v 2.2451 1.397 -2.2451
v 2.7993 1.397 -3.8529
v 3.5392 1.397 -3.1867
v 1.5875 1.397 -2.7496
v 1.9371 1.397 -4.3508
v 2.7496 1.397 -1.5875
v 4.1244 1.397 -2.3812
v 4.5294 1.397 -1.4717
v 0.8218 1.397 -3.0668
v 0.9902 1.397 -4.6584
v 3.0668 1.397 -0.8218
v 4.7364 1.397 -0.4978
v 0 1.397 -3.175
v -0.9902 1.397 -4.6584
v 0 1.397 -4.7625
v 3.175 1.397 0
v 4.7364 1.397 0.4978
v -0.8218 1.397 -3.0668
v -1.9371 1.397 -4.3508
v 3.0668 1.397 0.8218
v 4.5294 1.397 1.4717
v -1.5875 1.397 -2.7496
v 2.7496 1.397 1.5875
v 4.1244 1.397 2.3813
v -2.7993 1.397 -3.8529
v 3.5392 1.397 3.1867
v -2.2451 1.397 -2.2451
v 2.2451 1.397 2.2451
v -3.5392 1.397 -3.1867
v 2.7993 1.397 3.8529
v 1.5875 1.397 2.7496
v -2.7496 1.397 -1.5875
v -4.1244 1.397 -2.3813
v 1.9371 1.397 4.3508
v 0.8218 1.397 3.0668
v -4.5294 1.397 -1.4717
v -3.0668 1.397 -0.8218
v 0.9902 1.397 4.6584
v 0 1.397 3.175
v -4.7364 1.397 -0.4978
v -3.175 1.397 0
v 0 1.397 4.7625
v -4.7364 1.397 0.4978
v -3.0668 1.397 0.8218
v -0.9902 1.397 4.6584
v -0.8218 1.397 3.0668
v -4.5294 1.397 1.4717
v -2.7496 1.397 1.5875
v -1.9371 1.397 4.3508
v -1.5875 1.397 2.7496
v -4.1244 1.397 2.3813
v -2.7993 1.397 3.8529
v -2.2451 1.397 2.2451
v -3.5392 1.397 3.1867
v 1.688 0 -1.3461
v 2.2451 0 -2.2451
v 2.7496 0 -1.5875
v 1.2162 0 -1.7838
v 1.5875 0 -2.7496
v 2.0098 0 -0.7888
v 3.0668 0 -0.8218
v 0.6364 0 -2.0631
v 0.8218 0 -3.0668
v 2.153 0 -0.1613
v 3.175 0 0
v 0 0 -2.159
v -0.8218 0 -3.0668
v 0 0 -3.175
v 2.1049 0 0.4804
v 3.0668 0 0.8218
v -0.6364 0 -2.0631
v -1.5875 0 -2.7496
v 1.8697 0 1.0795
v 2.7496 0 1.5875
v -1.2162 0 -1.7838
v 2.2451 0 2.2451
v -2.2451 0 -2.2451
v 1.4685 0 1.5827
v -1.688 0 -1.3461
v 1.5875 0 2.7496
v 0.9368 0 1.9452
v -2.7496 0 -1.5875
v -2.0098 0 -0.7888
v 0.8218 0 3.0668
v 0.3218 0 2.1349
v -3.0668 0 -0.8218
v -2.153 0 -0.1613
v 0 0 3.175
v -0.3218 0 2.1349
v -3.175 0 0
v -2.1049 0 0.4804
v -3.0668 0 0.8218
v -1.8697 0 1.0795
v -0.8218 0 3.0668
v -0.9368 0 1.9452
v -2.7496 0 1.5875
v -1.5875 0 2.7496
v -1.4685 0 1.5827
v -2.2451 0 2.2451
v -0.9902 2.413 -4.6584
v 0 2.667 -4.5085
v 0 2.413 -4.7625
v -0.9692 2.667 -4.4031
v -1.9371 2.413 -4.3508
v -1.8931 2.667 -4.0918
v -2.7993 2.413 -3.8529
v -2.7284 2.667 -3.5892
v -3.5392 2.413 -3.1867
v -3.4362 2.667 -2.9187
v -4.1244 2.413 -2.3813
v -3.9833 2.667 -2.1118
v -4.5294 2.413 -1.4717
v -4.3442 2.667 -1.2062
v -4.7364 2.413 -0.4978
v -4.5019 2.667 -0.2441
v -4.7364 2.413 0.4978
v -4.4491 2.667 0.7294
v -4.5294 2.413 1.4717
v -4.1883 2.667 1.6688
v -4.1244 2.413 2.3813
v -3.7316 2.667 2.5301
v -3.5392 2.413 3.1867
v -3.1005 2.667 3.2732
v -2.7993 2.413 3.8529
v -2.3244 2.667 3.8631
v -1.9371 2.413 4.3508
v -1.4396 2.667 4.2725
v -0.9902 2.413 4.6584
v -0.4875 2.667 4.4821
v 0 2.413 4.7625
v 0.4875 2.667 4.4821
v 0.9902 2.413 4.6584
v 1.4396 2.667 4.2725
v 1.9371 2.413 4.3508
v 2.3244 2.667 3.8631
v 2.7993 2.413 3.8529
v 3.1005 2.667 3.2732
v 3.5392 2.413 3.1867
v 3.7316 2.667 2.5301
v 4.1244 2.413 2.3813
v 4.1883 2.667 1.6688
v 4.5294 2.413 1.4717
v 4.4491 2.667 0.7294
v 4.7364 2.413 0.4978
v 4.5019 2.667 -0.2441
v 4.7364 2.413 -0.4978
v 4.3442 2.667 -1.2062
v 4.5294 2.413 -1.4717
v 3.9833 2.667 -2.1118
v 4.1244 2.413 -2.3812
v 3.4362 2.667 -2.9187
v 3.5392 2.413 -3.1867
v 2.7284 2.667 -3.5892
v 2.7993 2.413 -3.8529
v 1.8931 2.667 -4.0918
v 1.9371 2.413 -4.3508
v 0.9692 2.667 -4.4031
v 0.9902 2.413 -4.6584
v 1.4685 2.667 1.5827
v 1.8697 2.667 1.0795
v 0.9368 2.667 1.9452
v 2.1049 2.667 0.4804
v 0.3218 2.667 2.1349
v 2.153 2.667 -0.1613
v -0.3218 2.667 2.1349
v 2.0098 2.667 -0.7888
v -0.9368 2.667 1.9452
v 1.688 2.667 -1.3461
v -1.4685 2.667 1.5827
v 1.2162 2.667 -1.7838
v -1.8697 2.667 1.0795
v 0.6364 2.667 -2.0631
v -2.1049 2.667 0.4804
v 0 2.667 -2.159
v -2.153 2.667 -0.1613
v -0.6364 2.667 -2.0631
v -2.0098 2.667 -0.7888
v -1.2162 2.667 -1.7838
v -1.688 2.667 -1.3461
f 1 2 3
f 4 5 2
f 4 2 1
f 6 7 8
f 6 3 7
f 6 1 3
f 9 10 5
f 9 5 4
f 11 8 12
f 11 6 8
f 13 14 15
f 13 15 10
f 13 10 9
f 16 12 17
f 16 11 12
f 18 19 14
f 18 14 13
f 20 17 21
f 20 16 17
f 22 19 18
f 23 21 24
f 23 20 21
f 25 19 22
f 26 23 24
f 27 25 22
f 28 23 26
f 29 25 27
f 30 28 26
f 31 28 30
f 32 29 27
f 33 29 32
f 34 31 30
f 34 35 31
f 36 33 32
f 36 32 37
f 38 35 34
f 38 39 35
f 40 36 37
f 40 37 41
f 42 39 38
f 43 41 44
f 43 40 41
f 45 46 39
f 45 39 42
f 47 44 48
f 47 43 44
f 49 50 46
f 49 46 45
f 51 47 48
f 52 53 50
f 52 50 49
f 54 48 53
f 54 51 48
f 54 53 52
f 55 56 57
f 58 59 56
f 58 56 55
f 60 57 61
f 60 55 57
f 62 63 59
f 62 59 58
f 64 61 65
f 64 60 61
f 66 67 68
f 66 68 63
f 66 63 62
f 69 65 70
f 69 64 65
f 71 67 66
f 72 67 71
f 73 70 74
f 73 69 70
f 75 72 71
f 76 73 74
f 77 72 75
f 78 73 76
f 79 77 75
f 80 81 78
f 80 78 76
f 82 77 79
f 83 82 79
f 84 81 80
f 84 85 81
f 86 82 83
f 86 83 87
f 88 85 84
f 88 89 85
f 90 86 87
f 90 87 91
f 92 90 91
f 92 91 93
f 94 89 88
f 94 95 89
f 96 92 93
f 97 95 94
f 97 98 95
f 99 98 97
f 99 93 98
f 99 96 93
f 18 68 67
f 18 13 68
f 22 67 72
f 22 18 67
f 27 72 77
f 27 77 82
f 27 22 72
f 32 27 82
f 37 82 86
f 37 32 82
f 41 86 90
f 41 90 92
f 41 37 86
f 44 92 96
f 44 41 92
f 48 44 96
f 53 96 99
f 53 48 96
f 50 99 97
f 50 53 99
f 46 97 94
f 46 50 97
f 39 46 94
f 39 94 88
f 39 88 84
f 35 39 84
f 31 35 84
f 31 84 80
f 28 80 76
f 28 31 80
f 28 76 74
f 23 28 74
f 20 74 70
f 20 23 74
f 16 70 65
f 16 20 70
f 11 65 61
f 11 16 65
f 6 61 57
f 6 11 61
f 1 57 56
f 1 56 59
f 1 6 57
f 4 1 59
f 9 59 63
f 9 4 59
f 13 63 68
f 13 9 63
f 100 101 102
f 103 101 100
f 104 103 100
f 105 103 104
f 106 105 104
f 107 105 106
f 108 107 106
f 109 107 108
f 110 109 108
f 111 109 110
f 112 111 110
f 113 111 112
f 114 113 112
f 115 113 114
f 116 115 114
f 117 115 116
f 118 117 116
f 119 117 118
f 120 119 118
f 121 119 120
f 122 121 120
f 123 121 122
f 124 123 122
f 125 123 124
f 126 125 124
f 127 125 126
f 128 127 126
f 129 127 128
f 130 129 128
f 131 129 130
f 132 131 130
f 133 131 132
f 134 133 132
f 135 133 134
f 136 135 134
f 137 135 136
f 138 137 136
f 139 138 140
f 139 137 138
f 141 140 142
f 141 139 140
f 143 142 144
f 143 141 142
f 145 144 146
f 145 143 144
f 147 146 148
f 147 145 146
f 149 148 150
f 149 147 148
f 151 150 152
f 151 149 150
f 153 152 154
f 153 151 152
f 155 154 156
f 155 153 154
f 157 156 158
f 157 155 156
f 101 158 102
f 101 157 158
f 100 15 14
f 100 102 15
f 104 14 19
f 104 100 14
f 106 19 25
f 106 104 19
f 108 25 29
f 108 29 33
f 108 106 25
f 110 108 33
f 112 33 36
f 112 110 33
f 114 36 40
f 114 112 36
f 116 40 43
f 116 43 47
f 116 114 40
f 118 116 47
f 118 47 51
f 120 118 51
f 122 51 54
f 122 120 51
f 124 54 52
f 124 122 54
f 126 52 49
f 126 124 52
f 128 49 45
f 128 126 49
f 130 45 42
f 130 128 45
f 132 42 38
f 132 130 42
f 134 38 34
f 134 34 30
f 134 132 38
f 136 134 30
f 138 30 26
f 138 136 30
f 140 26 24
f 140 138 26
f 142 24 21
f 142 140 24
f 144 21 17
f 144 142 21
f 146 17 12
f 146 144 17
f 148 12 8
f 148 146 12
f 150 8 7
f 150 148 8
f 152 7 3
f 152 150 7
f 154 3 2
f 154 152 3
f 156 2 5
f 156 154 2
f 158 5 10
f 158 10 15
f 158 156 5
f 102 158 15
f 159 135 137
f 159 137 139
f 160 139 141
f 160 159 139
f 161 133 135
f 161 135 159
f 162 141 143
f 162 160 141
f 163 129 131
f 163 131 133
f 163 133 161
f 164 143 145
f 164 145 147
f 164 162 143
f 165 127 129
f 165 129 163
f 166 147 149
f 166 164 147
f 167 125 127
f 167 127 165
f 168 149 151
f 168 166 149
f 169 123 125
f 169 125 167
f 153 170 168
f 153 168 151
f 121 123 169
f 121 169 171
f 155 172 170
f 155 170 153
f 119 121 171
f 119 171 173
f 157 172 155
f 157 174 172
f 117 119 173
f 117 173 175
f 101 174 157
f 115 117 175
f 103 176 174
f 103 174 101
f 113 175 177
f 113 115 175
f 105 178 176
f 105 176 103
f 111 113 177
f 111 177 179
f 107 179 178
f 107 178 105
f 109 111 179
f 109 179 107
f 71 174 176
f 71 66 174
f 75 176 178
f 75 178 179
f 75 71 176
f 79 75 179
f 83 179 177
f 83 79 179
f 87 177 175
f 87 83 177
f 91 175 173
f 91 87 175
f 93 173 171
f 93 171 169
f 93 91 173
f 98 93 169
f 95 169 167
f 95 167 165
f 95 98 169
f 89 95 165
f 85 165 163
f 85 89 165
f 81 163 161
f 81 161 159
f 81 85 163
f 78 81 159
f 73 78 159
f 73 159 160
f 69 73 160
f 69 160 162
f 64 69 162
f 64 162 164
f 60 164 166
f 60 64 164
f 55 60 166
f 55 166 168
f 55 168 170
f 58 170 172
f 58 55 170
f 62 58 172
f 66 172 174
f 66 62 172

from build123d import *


with BuildPart() as part:
    # Washer Revolve Profile → Washer Revolve (revolve)
    with BuildSketch(Plane.XY):
        Polygon((2.159, 2.667), (2.159, 0), (3.175, 0), (3.175, 1.397), (4.7625, 1.397), (4.7625, 2.413), (4.5085, 2.667), align=None)
    revolve(axis=Axis((0, 0, 0), (0, 1, 0)))


solid = part.part
